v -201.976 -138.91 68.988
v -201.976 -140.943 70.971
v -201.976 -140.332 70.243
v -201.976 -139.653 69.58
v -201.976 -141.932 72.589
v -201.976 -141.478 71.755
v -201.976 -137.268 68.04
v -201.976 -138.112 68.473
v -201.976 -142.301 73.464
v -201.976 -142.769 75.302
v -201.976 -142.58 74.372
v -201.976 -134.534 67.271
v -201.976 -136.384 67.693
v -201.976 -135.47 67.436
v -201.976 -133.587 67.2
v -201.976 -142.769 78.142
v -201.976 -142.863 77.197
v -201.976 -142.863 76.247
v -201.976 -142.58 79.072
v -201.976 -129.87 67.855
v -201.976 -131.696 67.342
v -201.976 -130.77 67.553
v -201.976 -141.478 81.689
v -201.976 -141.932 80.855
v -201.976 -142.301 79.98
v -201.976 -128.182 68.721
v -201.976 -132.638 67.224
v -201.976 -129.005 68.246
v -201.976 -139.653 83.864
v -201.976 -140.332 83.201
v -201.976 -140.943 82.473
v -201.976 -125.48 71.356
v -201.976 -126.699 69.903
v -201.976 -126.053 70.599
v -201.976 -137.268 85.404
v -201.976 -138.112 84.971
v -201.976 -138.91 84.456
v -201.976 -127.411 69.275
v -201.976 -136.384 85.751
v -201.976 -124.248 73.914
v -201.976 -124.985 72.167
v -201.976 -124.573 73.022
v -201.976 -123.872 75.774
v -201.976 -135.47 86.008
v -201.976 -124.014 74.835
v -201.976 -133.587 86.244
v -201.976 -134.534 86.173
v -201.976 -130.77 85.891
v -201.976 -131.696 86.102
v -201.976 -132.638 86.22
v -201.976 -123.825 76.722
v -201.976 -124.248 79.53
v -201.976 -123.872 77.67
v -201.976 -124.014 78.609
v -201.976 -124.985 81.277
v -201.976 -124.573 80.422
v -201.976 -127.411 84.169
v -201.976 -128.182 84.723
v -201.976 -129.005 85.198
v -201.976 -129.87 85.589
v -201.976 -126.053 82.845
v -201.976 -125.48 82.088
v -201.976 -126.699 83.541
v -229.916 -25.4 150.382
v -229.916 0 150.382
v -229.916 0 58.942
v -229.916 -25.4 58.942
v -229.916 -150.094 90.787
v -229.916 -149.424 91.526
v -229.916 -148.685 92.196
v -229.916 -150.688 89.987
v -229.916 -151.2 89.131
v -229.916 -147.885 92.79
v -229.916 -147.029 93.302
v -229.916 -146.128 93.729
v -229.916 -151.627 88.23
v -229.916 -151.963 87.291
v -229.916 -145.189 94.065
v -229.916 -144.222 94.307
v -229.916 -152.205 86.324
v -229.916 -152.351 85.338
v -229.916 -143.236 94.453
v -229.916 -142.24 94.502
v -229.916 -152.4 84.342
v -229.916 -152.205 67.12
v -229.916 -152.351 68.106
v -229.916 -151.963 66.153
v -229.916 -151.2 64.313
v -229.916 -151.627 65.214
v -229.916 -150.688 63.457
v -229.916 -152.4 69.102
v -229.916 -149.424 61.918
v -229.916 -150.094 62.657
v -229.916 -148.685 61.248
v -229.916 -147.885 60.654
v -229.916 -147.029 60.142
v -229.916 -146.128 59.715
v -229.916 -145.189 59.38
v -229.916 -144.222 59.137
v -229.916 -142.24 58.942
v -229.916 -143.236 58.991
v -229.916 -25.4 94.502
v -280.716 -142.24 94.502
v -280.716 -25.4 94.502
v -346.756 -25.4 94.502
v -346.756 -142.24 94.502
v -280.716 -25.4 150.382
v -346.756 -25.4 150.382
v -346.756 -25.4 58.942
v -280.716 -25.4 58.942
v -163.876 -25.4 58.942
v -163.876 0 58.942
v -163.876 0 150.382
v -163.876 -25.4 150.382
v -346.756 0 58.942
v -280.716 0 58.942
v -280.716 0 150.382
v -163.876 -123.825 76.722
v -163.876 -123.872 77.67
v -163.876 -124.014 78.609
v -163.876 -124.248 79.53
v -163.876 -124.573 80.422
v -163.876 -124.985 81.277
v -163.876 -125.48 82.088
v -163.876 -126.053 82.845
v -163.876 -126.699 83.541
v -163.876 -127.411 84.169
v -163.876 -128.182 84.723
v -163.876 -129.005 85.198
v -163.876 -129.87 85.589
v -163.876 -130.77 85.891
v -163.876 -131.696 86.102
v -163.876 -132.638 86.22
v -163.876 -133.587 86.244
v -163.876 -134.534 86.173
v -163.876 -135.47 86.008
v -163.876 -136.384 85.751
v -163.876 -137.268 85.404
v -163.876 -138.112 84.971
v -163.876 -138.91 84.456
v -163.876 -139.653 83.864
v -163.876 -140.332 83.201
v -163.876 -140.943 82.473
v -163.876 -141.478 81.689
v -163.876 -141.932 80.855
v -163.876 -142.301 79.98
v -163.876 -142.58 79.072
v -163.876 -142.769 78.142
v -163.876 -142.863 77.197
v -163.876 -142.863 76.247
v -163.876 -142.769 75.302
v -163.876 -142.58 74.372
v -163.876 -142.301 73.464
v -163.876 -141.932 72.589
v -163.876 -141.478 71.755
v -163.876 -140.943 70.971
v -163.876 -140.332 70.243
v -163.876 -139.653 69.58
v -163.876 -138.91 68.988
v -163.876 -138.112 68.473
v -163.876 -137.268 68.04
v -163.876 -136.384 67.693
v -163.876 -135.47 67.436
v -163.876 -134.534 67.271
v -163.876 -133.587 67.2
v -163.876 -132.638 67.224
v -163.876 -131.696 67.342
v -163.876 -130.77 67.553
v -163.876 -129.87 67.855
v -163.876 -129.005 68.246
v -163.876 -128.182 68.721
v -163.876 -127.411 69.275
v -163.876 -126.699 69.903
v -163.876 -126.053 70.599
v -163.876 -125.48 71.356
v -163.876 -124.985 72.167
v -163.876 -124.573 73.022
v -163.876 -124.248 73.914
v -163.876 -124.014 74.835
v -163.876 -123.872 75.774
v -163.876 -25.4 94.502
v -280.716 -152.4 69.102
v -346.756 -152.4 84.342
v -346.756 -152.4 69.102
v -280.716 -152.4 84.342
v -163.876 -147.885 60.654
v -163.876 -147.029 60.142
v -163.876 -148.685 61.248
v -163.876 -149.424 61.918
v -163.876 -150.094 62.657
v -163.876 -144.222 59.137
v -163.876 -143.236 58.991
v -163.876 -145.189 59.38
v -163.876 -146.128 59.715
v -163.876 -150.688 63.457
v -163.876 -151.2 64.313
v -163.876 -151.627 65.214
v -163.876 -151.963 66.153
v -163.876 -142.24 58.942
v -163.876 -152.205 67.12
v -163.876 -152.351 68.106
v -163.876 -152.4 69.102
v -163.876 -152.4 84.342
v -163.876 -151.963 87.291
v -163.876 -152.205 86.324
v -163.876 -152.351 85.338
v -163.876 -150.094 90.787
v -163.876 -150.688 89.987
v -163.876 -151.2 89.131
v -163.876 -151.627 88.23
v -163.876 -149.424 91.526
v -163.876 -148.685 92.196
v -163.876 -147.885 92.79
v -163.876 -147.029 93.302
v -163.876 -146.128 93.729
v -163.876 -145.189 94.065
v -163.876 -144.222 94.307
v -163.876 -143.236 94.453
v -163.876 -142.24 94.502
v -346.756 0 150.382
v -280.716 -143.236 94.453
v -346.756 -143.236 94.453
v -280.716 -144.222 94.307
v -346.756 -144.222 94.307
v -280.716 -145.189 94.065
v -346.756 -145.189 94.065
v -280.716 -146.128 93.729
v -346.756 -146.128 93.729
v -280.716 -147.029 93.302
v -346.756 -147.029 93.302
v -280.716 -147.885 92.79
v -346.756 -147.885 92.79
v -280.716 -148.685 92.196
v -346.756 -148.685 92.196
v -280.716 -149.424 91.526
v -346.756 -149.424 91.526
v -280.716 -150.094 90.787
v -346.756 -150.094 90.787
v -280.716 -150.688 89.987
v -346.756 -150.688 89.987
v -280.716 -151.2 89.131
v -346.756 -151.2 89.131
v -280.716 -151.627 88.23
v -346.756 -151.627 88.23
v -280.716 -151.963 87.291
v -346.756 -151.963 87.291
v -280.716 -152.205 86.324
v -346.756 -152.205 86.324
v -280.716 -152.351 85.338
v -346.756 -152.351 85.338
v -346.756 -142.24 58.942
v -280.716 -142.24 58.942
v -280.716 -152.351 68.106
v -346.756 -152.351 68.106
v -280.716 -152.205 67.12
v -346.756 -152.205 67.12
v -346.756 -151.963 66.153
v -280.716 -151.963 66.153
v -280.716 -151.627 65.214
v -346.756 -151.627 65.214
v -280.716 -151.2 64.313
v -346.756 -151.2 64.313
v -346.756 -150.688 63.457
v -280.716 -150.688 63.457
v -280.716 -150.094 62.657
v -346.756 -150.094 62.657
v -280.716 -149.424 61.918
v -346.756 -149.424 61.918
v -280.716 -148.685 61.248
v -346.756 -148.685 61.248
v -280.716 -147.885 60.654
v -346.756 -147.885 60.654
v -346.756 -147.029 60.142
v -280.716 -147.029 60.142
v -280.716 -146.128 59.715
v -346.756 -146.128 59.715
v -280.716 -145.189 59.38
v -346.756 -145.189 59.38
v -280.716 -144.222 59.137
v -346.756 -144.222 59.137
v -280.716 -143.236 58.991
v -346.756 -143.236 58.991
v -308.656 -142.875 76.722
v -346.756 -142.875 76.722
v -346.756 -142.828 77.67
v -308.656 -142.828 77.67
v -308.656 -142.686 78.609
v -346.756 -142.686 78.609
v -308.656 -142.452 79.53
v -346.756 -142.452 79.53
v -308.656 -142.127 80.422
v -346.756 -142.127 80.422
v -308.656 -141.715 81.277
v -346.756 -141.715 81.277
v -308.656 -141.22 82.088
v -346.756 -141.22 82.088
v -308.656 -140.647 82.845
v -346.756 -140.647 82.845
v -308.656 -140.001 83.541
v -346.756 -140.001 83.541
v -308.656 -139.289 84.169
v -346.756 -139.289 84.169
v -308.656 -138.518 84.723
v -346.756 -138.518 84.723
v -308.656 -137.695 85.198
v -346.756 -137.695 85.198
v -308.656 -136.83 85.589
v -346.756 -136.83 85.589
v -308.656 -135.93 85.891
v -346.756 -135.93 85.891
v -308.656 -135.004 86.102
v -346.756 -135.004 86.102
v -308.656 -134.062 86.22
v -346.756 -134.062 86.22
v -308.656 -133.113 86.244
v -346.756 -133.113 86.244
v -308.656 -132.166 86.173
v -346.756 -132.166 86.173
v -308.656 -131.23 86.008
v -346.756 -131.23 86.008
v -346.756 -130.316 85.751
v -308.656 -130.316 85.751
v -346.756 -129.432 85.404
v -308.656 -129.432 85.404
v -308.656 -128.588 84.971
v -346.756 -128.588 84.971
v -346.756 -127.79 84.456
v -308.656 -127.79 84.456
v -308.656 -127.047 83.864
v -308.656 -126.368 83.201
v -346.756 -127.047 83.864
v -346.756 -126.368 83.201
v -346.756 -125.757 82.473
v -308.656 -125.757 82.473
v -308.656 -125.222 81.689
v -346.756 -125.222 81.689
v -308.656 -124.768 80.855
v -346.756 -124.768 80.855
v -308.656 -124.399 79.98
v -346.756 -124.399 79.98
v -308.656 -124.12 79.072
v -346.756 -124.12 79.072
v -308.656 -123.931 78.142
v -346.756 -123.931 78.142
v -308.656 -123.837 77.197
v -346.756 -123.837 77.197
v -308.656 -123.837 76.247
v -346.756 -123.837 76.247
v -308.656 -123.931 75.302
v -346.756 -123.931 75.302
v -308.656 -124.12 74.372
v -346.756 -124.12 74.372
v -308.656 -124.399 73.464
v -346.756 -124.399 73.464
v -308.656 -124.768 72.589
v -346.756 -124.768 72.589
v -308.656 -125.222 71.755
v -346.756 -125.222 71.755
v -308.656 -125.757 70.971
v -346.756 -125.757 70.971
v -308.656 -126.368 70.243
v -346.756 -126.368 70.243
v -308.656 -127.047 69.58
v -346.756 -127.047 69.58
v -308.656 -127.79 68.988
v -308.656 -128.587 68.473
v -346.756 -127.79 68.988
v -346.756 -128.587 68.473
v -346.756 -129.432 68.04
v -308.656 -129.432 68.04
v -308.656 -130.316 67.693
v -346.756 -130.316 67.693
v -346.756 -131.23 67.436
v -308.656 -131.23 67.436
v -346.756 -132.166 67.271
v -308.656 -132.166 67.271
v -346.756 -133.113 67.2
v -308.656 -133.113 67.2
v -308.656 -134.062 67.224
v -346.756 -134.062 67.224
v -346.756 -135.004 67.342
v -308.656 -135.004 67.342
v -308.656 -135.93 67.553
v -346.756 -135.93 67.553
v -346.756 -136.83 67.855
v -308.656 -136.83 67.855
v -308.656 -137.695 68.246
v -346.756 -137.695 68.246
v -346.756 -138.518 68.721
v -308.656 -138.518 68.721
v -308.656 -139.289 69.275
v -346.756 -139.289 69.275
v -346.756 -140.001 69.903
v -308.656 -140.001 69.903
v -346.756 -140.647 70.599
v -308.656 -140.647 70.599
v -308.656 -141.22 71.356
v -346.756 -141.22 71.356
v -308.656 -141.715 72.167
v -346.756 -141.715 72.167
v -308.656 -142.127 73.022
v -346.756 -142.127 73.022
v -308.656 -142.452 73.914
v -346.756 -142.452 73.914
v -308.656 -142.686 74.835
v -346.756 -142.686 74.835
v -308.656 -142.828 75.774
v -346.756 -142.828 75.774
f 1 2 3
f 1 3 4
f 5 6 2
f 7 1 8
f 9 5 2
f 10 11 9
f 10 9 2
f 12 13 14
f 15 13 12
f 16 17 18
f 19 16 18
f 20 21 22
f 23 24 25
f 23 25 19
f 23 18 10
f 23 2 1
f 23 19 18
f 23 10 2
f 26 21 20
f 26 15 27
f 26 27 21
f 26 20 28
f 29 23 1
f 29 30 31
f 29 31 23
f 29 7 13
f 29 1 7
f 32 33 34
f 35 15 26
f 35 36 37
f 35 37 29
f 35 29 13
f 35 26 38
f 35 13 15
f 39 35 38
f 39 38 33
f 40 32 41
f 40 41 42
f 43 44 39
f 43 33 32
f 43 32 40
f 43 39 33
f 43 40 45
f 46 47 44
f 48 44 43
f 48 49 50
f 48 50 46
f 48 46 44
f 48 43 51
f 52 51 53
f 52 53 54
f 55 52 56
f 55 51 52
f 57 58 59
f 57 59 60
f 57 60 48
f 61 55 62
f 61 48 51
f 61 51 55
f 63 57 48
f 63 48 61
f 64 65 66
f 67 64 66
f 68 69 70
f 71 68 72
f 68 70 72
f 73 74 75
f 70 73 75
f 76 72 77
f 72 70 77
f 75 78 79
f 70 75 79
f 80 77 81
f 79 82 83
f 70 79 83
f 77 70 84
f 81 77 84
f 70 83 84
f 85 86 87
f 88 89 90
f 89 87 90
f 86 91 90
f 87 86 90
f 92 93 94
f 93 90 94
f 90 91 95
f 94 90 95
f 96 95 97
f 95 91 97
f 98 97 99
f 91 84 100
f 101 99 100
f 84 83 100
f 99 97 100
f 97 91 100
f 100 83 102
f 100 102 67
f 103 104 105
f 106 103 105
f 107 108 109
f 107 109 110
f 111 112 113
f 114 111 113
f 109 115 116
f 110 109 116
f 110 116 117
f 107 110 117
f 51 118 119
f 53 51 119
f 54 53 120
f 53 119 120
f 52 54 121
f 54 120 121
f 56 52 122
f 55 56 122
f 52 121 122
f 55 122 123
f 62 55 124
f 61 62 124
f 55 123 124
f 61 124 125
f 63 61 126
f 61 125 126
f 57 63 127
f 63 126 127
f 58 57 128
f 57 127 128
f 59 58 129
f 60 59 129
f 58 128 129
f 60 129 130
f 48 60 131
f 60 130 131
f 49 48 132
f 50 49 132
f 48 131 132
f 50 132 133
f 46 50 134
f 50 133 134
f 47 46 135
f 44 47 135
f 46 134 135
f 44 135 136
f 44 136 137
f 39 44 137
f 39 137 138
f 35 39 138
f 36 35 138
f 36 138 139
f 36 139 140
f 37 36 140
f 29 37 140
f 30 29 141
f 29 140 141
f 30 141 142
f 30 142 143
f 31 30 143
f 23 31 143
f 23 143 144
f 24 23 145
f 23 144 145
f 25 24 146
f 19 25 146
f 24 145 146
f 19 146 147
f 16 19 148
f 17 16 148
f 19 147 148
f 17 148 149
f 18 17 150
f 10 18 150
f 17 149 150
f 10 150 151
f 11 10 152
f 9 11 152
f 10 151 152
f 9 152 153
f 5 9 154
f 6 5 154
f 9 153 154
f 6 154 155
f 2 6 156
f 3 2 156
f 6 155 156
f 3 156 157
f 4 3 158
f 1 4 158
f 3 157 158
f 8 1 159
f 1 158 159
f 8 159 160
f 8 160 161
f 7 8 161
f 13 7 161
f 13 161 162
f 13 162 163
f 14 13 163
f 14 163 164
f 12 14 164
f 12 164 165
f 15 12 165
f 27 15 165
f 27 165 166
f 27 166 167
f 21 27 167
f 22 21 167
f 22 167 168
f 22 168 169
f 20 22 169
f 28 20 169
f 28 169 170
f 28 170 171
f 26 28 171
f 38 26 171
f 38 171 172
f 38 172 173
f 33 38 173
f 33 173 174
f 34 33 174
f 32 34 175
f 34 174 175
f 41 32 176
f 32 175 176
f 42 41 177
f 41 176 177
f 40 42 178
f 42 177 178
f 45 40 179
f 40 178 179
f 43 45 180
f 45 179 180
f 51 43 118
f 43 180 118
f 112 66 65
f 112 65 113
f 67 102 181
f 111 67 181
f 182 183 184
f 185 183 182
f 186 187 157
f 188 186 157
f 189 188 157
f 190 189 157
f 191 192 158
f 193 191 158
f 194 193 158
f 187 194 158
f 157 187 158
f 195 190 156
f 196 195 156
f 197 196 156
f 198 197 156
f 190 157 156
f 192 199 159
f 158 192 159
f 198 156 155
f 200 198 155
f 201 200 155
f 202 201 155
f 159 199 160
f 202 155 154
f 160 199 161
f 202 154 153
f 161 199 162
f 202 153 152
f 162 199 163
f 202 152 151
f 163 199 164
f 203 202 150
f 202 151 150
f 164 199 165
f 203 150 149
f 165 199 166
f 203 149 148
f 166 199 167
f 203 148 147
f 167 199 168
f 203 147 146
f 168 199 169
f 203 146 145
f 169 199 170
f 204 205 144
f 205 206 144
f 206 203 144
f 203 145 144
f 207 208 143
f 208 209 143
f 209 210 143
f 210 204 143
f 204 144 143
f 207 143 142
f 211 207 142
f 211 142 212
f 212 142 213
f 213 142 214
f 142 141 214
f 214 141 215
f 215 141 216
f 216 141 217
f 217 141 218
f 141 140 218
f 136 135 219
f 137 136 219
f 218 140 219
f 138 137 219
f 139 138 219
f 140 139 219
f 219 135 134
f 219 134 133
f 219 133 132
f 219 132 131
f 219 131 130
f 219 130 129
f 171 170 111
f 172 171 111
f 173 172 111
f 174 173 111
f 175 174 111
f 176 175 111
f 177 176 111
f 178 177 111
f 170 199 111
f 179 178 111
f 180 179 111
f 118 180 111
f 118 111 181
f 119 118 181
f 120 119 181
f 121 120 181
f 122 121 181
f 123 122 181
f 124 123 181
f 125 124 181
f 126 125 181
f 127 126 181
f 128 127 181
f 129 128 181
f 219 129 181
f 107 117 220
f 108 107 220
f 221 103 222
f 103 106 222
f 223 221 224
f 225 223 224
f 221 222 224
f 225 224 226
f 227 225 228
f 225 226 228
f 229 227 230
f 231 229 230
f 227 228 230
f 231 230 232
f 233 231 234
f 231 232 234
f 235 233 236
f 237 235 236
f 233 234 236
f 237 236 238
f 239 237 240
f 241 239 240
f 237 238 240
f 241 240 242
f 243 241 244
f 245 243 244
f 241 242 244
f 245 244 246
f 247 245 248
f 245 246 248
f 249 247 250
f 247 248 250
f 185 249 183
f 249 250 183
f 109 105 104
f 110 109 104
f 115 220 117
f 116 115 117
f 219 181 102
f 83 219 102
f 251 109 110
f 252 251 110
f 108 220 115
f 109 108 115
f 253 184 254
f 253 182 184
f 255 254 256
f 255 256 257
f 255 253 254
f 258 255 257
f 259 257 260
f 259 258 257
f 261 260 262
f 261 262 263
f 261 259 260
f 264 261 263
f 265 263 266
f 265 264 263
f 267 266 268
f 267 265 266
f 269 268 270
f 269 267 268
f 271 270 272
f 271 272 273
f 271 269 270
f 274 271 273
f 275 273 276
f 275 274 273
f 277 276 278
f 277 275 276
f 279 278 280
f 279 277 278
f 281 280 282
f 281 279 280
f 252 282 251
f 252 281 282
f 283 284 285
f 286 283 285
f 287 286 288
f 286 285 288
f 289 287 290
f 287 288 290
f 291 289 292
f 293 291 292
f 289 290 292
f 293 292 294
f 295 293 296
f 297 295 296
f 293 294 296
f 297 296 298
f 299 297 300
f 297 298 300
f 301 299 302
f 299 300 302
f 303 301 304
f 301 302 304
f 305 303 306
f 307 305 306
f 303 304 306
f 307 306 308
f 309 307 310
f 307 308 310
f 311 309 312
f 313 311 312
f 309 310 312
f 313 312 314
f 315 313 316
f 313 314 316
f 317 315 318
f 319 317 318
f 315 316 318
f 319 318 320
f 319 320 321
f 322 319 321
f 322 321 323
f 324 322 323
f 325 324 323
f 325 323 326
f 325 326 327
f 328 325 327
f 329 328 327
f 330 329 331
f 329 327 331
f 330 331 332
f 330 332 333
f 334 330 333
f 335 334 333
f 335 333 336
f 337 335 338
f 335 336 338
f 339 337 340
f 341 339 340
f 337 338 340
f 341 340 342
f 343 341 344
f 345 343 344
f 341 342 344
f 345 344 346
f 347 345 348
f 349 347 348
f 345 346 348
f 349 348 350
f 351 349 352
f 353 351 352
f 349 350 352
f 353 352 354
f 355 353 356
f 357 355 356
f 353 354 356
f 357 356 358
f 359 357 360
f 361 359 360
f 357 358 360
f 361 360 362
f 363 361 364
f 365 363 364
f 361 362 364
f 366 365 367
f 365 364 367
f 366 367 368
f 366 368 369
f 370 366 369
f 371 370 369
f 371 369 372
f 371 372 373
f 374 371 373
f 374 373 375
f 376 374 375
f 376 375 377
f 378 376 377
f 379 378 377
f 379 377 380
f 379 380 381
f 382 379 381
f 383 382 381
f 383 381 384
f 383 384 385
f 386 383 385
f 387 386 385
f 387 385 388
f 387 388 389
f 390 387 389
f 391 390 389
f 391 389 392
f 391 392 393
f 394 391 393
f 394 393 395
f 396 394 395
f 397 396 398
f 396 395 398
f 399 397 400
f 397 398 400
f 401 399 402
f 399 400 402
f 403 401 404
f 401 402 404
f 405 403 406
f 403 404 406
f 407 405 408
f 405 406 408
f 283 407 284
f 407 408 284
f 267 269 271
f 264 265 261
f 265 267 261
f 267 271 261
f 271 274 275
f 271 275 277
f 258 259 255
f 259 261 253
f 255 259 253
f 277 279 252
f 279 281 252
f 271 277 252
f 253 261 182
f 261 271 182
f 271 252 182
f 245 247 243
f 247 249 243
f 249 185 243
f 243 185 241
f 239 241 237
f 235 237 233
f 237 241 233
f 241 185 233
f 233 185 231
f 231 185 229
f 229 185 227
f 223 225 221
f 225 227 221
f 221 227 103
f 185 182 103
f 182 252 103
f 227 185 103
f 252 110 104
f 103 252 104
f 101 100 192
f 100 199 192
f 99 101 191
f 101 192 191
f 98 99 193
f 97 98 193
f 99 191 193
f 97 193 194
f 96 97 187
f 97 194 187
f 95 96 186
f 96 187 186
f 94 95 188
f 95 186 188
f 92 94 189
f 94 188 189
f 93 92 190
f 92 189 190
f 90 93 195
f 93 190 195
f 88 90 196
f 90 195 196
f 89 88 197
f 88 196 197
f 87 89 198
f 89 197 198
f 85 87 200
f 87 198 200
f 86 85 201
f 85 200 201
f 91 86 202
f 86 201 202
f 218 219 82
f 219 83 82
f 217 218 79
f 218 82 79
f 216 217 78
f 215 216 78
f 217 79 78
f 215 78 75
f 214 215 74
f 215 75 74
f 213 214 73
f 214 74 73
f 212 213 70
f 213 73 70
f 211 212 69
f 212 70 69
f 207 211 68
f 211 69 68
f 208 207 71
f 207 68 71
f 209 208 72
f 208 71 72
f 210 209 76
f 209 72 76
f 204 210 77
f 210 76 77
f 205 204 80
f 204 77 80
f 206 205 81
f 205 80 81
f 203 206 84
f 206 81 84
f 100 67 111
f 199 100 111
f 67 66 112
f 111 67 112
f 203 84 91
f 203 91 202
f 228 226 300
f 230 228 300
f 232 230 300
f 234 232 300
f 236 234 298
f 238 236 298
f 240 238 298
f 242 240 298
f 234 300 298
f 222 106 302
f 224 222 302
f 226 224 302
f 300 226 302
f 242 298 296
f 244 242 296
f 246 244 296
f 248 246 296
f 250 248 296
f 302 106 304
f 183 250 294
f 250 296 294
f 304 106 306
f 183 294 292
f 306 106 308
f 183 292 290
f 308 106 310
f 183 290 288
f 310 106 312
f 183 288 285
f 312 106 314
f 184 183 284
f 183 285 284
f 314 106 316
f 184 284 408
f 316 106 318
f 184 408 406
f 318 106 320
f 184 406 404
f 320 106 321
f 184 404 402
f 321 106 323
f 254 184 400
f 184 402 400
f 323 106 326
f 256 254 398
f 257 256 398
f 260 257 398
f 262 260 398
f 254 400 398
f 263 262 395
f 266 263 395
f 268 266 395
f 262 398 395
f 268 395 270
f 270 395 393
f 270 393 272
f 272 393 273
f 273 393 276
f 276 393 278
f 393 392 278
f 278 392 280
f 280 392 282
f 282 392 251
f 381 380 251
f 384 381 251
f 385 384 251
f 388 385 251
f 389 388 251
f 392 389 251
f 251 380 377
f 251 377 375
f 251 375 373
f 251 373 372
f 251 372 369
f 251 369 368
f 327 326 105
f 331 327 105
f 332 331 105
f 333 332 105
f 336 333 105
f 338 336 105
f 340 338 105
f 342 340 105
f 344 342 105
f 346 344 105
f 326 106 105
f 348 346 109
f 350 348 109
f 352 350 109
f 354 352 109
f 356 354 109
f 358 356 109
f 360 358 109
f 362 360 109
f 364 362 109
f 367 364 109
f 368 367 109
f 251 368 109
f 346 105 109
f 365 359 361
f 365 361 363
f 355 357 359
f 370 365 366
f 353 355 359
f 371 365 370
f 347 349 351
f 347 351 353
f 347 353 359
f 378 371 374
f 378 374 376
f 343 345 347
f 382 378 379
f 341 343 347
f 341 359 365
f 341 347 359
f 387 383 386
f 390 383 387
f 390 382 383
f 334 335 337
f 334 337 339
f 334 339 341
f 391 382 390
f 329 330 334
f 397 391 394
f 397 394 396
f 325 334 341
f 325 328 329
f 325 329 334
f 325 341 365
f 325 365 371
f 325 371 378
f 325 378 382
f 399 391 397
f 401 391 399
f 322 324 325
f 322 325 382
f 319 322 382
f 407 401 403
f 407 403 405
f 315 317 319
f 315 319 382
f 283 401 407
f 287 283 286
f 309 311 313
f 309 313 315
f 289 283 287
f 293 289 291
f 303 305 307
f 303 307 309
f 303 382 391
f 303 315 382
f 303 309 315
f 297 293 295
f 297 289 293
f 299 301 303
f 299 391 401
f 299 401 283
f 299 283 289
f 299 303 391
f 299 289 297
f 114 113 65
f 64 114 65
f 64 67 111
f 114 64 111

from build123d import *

# Parameters (mm, degrees)
F1_DEPTH = 25.4
F3_DEPTH = 127
F4_R     = 9.525
F5_DEPTH = 38.1
F6_R     = 9.525
F7_DEPTH = 38.1
F8_R     = 10.16
F9_R     = 10.16


with BuildPart() as f1:
    # F0 (on Front) → F1 (new body)
    with BuildSketch(Plane.XZ):
        Polygon((-229.916182, 150.382031), (-229.916182, 125.75157), (-229.916182, 58.942031), (-163.876182, 58.942031), (-163.876182, 150.382031), align=None)
        Polygon((-280.716182, 150.382031), (-346.756182, 150.382031), (-346.756182, 58.942031), (-280.716182, 58.942031), (-280.716182, 125.75157), align=None)
    extrude(amount=F1_DEPTH)


with BuildPart() as f3:
    # F2 (on face) → F3 (new body)
    with BuildSketch(Plane.XZ.offset(25.4)):
        Polygon((-229.916182, 94.502031), (-229.916182, 72.495423), (-229.916182, 58.942031), (-163.876182, 58.942031), (-163.876182, 94.502031), align=None)
        Polygon((-280.716182, 94.502031), (-346.756182, 94.502031), (-346.756182, 58.942031), (-280.716182, 58.942031), (-280.716182, 72.495423), align=None)
    extrude(amount=F3_DEPTH)

    # F4 (on face) → F5 (cut)
    with BuildSketch(Plane.YZ.offset(-163.876182)):
        with Locations((-133.35, 76.722031)):
            Circle(F4_R)
    extrude(amount=-F5_DEPTH, mode=Mode.SUBTRACT)

    # F6 (on face) → F7 (cut)
    with BuildSketch(Plane(origin=(-346.756182, 0, 0), x_dir=(0, -1, 0), z_dir=(-1, 0, 0))):
        with Locations((133.35, 76.722031)):
            Circle(F6_R)
    extrude(amount=-F7_DEPTH, mode=Mode.SUBTRACT)

    # F8
    f8_edges = [f3.edges().sort_by_distance(p)[0] for p in [
        (-313.736182, -152.4, 94.502031),
        (-313.736182, -152.4, 58.942031),
    ]]
    fillet(f8_edges, radius=F8_R)

    # F9
    f9_edges = [f3.edges().sort_by_distance(p)[0] for p in [
        (-196.896182, -152.4, 58.942031),
        (-196.896182, -152.4, 94.502031),
    ]]
    fillet(f9_edges, radius=F9_R)


solid = Compound([f1.part, f3.part])
